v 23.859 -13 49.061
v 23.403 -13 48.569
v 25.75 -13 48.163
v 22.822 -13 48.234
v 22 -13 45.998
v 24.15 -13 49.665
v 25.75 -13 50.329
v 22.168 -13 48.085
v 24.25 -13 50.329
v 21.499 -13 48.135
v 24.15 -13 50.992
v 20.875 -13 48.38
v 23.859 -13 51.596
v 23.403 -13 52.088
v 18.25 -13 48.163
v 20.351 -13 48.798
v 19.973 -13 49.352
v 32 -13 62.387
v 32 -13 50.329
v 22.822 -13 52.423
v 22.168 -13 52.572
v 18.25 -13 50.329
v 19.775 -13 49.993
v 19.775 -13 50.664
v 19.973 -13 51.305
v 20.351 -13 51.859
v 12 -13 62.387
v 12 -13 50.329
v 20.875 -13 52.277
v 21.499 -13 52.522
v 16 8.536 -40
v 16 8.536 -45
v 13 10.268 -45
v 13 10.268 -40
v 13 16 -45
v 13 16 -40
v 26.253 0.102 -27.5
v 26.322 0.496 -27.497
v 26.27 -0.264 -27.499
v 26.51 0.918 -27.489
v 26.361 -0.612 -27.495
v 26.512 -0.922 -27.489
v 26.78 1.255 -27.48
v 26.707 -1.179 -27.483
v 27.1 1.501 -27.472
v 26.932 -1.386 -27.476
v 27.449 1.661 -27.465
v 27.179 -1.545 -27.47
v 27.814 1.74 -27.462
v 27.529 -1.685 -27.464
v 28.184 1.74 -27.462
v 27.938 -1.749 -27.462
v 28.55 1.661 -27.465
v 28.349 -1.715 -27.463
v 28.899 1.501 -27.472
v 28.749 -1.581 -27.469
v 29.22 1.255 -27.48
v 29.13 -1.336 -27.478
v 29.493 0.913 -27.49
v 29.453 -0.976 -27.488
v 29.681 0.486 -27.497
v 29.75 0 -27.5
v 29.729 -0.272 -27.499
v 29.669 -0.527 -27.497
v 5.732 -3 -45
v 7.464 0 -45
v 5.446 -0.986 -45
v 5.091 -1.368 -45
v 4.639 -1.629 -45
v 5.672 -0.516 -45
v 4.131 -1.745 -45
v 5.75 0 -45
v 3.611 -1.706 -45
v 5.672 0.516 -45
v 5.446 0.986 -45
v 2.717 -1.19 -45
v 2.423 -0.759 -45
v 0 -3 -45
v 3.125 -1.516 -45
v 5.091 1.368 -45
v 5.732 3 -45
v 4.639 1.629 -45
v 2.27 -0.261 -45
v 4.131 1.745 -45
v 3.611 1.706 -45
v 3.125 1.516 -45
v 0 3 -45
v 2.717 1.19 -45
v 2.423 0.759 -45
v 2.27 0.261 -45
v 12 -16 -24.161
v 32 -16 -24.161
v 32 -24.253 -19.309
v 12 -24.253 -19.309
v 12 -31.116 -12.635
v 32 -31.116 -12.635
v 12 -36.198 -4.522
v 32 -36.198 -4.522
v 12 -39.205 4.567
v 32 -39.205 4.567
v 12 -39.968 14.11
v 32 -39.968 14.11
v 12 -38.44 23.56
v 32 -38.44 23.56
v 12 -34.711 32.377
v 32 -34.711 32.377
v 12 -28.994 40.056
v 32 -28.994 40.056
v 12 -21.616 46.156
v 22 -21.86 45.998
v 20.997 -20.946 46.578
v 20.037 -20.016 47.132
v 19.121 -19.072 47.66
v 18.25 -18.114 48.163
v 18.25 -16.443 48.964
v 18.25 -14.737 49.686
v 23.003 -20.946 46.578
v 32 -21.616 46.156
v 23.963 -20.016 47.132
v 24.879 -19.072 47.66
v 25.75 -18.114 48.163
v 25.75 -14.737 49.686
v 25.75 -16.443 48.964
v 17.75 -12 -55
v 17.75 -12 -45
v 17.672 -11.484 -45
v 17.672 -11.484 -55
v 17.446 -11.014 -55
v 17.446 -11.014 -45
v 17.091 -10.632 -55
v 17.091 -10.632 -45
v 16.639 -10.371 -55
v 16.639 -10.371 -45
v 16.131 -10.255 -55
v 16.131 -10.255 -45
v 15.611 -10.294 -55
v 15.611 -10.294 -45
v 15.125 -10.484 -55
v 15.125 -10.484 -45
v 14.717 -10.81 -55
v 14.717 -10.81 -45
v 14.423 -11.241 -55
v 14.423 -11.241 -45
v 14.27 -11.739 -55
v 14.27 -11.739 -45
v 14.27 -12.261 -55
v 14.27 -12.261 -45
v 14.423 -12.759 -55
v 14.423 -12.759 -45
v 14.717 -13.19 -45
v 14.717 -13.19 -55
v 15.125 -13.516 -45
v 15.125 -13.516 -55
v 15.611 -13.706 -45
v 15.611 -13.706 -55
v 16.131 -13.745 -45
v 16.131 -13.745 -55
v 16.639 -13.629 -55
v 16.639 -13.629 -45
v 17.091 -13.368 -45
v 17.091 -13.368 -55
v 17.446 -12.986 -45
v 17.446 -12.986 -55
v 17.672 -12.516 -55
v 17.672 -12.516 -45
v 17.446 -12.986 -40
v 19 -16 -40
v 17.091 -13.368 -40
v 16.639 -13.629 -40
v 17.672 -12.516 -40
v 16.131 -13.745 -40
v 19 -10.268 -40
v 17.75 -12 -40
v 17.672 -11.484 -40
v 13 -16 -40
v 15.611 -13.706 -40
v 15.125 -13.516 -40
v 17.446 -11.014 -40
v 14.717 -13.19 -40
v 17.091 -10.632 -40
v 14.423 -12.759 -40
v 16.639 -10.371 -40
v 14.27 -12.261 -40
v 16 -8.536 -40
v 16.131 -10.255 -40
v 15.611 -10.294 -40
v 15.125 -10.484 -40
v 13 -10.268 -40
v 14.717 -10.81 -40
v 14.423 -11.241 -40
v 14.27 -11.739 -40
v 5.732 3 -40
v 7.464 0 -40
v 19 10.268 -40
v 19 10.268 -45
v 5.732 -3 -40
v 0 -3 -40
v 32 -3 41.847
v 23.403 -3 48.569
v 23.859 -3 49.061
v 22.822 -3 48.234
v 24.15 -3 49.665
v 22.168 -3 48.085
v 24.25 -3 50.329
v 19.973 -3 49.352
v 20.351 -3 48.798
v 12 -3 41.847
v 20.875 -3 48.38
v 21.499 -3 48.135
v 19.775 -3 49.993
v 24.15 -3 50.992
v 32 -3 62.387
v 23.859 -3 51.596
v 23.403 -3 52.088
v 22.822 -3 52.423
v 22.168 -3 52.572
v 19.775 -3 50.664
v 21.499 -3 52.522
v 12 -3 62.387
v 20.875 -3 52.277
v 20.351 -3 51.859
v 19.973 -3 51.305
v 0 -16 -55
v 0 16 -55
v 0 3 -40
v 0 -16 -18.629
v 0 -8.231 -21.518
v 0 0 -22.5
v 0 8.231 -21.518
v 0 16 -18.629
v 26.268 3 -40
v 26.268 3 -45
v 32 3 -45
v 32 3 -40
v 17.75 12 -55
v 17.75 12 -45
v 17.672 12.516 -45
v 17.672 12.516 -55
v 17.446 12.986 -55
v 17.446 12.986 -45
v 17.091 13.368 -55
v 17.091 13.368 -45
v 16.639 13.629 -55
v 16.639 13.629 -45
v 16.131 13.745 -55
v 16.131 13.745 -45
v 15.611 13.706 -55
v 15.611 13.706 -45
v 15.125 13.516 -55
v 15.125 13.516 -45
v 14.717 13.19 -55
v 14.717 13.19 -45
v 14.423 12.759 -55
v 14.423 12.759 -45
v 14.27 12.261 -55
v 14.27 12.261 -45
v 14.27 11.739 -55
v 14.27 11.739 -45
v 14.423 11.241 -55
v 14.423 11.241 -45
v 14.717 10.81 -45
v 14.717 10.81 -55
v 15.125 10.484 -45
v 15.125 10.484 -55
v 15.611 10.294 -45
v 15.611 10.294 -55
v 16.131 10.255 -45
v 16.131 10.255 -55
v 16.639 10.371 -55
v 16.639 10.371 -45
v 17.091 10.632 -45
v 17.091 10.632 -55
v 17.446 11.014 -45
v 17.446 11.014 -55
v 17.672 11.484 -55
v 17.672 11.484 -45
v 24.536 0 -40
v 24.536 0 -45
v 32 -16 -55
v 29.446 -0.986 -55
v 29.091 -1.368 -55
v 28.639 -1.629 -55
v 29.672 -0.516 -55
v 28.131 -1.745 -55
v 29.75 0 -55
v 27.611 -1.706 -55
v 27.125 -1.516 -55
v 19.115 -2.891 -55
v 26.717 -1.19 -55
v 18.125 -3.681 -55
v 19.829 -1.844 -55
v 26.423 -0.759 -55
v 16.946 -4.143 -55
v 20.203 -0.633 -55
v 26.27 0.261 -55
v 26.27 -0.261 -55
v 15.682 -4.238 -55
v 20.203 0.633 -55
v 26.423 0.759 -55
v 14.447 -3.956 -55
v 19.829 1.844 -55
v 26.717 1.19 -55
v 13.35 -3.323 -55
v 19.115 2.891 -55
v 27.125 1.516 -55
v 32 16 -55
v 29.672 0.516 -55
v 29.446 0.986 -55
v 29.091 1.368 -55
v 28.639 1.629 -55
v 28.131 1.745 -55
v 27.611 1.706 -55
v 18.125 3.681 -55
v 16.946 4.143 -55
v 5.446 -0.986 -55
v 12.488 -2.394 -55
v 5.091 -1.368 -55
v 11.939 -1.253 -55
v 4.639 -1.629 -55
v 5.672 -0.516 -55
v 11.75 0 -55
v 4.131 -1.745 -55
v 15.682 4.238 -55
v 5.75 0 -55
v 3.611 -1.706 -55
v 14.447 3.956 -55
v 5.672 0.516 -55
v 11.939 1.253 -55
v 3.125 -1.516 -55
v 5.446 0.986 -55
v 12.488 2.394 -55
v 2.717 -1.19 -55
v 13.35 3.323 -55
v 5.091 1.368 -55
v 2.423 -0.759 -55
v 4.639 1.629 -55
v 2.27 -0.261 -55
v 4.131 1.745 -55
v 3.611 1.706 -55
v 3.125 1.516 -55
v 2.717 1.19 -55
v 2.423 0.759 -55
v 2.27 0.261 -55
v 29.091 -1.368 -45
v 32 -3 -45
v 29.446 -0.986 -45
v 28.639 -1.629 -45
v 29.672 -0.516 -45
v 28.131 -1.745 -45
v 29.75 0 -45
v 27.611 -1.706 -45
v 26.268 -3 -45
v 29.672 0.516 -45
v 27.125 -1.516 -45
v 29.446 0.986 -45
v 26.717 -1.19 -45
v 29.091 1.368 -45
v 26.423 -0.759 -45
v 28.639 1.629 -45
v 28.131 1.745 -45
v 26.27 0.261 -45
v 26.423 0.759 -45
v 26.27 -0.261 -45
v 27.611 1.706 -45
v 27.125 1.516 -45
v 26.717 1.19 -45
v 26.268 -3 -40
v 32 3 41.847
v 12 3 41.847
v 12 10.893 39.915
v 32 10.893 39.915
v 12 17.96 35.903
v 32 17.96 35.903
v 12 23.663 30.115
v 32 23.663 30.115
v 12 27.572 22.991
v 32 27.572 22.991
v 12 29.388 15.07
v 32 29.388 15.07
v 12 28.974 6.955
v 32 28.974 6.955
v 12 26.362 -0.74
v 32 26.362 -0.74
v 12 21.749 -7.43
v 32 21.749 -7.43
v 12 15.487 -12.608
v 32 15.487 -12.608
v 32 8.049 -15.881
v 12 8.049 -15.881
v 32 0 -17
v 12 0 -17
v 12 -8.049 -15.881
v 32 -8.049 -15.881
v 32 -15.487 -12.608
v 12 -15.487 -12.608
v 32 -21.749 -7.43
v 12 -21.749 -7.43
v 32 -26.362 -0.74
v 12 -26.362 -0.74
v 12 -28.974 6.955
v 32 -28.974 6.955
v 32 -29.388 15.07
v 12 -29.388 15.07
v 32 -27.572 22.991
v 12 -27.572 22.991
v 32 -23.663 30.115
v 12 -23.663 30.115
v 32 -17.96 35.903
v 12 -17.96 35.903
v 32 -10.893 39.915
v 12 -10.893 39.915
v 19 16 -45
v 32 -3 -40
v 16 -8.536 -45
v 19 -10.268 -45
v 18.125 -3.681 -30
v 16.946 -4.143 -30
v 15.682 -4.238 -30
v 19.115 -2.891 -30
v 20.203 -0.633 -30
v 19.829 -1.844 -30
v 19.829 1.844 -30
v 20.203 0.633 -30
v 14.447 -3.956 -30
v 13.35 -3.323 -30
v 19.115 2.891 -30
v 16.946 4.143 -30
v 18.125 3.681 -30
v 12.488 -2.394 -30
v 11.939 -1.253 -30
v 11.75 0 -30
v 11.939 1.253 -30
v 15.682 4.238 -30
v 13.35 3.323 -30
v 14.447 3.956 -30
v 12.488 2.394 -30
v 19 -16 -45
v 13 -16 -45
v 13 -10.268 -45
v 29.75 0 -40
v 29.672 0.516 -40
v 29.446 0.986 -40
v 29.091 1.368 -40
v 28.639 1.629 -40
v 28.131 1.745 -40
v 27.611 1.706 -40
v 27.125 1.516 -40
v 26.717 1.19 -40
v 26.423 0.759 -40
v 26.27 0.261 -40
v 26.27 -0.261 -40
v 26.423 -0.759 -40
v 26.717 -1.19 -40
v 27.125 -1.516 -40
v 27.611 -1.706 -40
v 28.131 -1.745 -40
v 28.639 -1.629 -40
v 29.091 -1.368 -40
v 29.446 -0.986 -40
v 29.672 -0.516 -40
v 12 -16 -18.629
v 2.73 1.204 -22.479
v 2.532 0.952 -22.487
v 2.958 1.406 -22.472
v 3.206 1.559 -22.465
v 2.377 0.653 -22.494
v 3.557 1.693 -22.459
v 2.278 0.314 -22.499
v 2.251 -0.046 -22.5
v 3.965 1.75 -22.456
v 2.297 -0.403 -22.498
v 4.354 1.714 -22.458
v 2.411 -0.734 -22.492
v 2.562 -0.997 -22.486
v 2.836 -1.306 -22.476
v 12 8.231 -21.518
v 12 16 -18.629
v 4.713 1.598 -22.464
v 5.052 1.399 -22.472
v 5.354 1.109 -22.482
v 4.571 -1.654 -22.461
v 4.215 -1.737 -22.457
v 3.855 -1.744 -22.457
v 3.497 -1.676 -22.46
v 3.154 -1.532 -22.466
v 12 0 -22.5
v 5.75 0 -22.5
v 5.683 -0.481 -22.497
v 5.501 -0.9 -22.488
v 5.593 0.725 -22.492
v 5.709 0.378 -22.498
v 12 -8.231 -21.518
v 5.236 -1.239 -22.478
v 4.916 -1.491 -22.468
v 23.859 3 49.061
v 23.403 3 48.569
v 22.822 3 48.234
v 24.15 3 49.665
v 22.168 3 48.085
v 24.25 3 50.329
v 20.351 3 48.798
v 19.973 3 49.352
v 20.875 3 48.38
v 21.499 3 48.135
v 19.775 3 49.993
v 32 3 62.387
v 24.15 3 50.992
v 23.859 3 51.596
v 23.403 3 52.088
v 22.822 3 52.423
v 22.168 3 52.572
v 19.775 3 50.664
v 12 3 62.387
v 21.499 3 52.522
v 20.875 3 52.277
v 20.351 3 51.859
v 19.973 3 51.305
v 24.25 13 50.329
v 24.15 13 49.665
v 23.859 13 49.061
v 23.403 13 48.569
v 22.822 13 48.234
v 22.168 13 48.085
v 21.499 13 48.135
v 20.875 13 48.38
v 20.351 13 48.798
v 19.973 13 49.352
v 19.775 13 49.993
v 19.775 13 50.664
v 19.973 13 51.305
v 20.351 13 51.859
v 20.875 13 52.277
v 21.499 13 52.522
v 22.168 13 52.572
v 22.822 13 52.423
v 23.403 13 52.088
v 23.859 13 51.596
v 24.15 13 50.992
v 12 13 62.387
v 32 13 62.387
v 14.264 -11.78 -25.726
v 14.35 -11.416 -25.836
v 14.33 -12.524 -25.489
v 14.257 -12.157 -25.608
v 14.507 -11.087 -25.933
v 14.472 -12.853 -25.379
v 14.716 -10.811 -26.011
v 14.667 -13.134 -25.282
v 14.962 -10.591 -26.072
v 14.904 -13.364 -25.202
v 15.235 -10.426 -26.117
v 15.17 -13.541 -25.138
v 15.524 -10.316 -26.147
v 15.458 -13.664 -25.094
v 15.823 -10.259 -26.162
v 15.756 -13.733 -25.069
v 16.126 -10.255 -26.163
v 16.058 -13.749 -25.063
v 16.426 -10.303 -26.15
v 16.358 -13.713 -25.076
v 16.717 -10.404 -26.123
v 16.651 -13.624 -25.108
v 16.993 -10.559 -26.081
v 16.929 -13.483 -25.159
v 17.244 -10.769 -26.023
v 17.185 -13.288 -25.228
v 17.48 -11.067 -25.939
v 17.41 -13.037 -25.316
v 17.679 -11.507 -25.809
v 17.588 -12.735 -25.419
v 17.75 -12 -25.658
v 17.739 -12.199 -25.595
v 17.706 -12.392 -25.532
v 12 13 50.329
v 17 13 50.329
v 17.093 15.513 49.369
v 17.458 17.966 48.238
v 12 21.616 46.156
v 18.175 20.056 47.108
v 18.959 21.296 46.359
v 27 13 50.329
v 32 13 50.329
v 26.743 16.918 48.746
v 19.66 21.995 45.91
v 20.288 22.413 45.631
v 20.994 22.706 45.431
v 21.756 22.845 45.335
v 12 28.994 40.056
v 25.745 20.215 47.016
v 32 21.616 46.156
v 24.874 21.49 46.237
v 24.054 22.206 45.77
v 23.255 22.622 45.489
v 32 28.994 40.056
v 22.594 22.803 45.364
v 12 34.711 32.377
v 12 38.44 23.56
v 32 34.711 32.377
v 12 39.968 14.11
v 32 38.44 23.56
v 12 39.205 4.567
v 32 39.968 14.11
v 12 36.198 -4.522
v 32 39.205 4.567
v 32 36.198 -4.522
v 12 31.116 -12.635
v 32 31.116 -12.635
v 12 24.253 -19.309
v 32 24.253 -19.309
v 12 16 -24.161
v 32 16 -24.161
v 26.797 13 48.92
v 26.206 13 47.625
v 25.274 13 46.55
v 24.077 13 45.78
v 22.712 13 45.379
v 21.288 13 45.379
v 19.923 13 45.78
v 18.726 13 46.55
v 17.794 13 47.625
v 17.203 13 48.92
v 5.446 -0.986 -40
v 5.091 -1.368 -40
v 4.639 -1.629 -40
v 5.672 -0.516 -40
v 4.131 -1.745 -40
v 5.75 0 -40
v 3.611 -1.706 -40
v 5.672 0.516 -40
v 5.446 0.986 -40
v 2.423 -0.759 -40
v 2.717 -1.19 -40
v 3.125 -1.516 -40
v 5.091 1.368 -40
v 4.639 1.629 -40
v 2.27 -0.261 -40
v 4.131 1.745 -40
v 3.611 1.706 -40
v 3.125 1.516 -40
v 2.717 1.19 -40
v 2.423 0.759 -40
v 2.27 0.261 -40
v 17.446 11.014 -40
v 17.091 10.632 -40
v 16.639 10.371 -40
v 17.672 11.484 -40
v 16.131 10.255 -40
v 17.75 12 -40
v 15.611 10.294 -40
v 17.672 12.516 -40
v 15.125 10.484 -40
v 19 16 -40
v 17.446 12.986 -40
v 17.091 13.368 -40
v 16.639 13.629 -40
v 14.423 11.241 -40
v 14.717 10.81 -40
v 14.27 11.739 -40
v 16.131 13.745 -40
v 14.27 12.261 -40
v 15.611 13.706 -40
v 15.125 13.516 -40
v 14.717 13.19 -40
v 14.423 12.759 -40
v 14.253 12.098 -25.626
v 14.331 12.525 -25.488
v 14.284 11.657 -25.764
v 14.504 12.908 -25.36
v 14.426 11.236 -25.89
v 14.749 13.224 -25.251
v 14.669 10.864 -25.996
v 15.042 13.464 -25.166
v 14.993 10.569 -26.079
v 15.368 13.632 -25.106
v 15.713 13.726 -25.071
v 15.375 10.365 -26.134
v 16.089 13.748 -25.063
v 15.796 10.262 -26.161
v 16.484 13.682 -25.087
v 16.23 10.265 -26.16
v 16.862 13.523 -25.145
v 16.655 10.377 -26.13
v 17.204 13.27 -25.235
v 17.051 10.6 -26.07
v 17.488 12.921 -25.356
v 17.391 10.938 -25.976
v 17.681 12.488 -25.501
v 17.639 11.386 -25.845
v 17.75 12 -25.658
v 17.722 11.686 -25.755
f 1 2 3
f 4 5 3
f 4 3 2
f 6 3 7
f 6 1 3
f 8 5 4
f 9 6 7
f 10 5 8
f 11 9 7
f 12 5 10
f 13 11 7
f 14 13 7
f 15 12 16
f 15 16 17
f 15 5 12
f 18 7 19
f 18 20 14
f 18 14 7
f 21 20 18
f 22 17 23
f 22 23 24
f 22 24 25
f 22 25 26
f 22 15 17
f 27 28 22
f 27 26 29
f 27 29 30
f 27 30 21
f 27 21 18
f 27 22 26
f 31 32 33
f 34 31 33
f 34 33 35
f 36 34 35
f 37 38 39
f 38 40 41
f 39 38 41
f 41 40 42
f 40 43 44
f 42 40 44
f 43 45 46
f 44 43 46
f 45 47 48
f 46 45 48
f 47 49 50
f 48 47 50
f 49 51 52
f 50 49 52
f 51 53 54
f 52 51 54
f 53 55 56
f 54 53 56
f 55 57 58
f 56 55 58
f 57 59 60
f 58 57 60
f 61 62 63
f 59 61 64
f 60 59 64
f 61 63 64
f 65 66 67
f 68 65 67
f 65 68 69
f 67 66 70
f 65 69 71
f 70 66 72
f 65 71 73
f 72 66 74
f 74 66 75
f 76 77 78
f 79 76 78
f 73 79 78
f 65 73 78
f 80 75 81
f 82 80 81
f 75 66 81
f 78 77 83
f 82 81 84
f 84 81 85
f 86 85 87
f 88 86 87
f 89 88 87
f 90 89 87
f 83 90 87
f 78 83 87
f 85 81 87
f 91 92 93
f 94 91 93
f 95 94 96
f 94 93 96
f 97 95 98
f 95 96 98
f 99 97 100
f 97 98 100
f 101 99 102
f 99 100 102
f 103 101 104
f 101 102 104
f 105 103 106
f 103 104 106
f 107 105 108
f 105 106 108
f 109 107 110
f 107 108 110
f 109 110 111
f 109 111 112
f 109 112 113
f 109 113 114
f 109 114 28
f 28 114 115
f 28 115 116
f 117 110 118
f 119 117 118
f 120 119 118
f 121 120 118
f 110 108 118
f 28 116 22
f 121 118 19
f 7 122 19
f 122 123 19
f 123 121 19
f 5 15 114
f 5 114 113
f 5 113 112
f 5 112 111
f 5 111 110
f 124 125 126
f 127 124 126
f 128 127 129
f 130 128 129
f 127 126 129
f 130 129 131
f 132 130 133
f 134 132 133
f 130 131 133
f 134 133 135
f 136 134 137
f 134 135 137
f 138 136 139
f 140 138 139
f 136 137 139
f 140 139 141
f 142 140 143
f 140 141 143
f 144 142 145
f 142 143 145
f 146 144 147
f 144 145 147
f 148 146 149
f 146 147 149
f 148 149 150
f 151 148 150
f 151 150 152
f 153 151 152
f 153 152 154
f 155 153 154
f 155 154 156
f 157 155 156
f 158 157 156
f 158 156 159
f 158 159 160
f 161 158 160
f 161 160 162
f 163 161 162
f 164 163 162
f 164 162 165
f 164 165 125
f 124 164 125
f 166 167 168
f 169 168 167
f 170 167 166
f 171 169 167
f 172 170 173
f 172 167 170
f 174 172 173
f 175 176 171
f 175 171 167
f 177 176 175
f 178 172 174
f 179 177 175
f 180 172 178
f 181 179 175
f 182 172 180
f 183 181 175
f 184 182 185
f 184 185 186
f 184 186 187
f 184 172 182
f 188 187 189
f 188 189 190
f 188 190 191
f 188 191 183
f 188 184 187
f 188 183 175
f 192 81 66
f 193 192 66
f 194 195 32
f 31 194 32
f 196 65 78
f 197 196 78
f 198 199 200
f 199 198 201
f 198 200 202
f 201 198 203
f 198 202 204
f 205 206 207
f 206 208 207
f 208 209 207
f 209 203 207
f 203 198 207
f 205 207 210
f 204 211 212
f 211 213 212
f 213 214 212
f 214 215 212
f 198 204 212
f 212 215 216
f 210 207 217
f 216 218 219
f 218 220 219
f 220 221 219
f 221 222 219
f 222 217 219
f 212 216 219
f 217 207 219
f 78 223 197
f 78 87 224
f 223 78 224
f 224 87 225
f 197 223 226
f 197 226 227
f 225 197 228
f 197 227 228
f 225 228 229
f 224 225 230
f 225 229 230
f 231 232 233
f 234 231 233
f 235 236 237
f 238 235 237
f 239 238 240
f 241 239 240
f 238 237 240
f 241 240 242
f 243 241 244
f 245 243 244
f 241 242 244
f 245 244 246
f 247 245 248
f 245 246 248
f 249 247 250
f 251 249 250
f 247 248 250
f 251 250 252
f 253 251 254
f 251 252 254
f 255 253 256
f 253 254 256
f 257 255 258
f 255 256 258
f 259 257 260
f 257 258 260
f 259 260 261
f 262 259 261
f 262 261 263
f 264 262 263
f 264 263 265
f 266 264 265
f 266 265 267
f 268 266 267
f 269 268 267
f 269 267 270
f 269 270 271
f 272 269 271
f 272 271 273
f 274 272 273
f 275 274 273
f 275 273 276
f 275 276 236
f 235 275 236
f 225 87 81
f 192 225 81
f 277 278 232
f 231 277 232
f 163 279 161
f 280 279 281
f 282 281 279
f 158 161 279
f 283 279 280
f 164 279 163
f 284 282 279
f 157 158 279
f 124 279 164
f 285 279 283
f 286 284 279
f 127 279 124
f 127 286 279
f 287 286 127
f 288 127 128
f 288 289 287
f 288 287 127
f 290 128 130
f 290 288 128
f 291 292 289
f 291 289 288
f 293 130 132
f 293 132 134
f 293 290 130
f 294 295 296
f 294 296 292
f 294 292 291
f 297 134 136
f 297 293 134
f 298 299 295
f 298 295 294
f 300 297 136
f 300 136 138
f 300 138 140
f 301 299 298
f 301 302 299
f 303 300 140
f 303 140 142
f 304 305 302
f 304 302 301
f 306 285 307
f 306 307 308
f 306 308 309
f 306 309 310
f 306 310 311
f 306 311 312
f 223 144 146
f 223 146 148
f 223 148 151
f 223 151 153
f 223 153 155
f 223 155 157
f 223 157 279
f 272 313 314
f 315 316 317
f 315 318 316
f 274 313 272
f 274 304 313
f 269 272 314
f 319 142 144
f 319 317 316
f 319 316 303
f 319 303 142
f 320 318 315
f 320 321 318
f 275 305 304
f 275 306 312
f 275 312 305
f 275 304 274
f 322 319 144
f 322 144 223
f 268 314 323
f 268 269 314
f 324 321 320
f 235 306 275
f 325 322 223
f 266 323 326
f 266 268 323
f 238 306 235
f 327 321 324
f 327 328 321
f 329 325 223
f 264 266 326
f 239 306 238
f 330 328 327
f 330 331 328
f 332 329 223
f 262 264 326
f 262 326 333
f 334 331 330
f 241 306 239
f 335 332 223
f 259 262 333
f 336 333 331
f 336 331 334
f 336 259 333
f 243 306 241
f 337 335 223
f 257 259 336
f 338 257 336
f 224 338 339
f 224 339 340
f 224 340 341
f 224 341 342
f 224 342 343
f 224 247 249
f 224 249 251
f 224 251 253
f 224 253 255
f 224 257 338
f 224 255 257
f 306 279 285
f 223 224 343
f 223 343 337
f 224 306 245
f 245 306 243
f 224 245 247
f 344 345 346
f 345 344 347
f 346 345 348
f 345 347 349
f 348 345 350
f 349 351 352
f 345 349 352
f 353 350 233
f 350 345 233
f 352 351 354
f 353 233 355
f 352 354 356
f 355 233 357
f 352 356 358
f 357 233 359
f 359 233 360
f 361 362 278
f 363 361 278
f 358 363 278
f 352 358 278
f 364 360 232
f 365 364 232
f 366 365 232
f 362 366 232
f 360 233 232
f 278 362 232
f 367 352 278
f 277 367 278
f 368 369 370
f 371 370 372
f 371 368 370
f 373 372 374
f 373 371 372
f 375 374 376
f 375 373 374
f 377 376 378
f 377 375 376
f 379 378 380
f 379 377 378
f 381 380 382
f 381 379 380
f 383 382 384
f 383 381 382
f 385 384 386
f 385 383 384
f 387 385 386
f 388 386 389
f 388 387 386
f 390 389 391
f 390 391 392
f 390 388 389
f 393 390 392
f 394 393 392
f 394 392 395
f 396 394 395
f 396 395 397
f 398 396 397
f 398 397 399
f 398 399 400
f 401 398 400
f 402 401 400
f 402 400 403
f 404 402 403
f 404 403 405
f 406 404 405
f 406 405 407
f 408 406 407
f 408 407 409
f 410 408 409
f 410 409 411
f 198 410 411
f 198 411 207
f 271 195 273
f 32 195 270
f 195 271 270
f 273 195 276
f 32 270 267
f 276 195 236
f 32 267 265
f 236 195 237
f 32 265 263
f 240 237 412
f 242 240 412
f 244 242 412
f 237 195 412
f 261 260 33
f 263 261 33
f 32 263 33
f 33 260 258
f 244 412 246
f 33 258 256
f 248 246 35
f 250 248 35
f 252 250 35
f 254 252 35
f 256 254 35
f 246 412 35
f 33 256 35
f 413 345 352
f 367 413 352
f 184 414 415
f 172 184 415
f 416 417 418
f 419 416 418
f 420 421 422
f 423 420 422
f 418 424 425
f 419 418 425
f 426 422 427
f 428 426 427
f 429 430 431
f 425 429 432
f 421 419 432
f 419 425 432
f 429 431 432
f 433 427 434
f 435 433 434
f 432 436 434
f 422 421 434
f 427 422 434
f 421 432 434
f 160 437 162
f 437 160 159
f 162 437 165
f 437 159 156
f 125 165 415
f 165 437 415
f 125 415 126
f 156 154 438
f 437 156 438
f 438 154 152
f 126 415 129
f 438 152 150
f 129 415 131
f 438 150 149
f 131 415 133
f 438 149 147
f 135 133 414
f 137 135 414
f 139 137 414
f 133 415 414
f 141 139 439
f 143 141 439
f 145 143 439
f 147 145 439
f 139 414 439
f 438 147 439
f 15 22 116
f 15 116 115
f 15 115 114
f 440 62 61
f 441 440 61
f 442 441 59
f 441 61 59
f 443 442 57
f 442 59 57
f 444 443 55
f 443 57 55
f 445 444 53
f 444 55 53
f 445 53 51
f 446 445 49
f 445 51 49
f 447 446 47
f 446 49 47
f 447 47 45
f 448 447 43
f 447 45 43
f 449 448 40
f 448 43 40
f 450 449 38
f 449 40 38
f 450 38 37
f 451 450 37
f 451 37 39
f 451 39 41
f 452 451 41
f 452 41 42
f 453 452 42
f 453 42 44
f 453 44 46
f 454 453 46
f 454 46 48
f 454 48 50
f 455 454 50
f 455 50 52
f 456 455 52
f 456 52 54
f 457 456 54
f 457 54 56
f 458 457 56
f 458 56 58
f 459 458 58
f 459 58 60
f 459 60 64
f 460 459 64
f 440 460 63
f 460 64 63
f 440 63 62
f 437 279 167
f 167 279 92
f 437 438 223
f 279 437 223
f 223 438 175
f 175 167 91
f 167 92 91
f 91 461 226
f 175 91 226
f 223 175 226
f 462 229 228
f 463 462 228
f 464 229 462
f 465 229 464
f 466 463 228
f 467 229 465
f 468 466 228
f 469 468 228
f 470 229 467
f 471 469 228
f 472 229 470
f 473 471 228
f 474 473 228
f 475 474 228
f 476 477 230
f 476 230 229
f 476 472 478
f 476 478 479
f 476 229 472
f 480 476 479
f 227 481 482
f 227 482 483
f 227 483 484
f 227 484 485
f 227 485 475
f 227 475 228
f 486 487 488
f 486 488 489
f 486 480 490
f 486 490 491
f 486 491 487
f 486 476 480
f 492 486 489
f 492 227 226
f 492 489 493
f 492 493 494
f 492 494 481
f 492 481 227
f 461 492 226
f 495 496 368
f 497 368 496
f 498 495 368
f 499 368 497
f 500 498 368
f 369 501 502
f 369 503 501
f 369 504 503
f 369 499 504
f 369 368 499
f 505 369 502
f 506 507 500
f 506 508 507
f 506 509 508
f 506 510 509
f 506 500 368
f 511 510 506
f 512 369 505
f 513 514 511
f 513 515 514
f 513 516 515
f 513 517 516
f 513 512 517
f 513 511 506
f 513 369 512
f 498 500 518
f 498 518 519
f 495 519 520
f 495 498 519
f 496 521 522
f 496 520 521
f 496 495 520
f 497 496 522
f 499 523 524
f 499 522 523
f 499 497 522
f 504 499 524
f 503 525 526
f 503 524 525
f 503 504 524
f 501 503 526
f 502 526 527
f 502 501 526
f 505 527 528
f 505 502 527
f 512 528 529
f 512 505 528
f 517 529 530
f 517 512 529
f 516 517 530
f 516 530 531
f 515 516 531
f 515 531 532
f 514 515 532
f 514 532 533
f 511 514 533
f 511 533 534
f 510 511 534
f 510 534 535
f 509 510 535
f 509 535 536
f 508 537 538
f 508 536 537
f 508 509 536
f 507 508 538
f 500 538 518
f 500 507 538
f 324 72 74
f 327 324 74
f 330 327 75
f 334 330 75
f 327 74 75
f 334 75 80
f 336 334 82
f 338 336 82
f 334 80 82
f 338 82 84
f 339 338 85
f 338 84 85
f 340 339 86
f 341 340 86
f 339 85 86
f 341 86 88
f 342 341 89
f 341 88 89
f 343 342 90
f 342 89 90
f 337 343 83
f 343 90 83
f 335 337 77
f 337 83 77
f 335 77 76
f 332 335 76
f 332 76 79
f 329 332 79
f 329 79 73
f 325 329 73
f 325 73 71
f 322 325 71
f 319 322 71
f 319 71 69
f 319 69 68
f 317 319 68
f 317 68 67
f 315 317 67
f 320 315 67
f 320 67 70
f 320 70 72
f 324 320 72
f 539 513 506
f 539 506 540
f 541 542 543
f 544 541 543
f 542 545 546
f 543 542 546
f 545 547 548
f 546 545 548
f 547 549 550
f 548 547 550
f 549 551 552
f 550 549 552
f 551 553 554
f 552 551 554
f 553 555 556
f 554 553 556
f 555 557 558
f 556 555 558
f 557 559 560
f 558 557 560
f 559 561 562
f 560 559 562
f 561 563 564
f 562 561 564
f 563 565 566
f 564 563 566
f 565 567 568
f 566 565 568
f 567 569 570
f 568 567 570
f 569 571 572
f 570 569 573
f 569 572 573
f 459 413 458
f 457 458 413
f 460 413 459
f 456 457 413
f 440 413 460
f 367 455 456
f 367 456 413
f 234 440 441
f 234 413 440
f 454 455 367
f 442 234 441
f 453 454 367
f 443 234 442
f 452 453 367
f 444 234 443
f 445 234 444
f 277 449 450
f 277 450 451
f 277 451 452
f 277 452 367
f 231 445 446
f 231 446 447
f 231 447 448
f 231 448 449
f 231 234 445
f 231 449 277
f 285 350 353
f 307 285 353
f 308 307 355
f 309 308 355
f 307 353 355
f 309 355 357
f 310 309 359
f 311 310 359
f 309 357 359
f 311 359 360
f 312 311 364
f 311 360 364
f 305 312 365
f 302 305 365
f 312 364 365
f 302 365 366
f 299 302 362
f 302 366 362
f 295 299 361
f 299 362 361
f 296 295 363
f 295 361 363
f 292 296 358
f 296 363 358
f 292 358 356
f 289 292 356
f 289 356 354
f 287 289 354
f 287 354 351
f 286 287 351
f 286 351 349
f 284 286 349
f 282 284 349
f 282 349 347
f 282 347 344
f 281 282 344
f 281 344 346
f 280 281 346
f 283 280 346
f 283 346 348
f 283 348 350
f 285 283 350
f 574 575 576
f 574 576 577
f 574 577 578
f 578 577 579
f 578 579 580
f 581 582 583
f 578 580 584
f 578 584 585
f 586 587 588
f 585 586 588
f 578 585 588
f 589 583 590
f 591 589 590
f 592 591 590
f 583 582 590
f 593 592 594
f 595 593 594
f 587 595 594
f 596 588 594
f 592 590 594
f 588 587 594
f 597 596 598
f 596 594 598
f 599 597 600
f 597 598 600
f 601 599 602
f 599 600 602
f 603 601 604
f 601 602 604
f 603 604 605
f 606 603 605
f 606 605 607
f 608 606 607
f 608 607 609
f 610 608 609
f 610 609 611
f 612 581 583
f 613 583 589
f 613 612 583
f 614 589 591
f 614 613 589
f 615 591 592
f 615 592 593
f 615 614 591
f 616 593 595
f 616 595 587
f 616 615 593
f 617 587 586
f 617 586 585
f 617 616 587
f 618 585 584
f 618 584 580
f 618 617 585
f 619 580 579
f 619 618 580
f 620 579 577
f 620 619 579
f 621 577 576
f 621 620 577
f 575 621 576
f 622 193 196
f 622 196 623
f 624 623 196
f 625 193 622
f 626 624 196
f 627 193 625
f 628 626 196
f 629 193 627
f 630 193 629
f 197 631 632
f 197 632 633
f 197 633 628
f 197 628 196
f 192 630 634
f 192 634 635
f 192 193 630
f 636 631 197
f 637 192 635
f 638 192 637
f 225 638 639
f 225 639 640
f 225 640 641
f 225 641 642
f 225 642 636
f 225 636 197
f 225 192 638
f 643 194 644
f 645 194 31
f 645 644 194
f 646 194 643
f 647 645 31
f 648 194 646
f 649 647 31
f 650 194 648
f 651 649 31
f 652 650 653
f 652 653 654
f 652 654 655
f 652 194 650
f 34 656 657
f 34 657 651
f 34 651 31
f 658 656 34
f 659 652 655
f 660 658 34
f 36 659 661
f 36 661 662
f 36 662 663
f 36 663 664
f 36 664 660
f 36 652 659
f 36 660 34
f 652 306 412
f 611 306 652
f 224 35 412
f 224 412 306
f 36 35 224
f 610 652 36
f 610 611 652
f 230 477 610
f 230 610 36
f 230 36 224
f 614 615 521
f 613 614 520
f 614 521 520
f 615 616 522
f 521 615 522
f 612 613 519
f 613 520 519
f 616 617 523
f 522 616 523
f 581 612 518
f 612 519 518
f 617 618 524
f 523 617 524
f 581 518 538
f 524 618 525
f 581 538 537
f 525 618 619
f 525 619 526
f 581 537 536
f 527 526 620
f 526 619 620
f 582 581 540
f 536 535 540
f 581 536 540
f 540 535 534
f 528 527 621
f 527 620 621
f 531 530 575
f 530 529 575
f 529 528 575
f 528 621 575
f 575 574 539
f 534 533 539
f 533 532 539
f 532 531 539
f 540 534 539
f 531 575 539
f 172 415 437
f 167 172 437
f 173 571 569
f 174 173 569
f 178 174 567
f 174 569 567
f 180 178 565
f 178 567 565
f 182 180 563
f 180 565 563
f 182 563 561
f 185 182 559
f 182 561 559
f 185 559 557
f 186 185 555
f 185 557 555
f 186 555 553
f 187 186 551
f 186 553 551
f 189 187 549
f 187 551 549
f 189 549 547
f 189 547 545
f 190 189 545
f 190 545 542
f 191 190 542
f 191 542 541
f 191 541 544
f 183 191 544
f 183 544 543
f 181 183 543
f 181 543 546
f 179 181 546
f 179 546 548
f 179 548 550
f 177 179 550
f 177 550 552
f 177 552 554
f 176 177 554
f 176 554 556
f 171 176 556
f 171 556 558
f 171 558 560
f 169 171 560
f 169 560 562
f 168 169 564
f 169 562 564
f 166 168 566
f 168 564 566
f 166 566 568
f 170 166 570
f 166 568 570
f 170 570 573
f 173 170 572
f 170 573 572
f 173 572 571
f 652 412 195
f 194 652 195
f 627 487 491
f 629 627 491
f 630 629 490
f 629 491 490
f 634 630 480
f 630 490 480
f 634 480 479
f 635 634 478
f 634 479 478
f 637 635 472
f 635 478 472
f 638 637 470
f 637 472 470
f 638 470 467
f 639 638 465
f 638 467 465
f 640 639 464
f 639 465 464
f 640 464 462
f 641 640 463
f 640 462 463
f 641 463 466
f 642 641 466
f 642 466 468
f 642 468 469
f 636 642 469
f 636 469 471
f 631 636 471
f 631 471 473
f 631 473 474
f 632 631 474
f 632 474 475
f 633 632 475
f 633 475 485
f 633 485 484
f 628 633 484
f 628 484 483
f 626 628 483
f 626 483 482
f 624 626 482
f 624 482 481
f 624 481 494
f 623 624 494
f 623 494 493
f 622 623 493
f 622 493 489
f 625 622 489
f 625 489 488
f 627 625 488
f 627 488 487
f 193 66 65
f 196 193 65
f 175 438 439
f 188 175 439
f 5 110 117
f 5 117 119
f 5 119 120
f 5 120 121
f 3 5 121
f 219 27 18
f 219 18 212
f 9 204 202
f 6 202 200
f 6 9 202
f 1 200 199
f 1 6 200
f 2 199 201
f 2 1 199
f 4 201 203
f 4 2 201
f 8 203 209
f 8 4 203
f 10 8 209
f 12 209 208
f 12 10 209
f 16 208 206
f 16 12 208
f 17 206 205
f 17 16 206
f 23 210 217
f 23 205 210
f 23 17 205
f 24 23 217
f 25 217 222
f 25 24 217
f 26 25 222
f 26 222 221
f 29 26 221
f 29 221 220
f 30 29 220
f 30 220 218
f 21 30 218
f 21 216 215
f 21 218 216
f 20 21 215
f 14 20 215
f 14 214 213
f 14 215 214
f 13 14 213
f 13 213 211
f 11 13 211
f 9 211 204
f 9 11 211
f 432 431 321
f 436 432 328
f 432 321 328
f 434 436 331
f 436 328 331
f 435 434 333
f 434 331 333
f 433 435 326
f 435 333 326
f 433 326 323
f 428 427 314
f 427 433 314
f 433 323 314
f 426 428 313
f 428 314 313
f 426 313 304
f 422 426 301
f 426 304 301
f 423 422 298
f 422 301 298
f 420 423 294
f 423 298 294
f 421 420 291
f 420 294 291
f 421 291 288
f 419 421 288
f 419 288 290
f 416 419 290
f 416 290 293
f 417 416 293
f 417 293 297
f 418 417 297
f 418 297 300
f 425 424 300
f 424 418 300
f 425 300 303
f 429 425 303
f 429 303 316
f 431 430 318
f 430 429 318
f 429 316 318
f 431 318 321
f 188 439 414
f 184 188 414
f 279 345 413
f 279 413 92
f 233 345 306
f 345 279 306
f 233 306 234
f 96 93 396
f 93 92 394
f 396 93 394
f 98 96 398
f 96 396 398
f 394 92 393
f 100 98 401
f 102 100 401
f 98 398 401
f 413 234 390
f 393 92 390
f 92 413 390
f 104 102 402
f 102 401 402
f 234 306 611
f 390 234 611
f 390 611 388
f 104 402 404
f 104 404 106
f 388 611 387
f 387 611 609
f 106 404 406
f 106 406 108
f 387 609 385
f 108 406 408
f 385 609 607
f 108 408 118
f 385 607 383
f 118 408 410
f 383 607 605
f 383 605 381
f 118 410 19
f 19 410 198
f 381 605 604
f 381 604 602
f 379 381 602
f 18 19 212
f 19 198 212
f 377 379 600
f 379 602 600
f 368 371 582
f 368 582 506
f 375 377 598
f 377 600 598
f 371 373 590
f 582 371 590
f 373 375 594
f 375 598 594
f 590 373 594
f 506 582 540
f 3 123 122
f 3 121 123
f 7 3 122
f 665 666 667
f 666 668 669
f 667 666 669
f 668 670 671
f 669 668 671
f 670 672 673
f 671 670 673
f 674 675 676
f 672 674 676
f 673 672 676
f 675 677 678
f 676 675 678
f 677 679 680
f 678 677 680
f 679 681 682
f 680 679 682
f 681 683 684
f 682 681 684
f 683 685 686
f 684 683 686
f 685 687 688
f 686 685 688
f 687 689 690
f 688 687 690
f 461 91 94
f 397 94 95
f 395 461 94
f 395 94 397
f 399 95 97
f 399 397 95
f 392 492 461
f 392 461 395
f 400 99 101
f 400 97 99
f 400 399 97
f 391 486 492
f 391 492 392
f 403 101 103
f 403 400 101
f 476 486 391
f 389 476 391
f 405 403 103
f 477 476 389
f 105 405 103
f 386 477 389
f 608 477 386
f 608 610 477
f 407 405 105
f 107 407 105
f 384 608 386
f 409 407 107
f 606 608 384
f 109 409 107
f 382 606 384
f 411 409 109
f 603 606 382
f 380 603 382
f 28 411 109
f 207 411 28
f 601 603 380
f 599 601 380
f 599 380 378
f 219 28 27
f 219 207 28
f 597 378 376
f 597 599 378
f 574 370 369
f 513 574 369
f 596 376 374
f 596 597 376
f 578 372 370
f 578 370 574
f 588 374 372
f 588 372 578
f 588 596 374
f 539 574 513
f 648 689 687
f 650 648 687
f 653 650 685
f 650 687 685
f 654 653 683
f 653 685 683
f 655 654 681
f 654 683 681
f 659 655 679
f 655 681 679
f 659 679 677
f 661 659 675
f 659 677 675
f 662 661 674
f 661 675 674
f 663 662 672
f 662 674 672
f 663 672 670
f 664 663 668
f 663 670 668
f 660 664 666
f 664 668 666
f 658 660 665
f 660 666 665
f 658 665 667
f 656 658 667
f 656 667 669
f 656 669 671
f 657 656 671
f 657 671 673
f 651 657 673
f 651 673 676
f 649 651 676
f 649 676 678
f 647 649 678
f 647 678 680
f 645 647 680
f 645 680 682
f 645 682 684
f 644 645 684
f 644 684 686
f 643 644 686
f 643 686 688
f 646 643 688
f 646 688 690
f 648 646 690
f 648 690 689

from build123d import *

# Parameters (mm, degrees)
BOSS_EXTRUDE1_DEPTH       = 32
SKETCH4_R                 = 16
CUT_EXTRUDE3_DEPTH        = 15
SKETCH5_R                 = 7
SKETCH5_R_2               = 4
BOSS_EXTRUDE2_DEPTH       = 17
SKETCH15_W                = 16
SKETCH15_H                = 32
CUT_EXTRUDE6_DEPTH        = 15
SKETCH16_W                = 32
SKETCH16_H                = 32
BOSS_EXTRUDE6_DEPTH       = 30
SKETCH17_R                = 1.75
CUT_EXTRUDE8_DEPTH        = 53.92447449
CUT_EXTRUDE10_START       = -10
CUT_EXTRUDE10_DEPTH       = 5
SKETCH20_R                = 4.25
CUT_EXTRUDE11_DEPTH       = 39
CUT_EXTRUDE12_DEPTH       = 10
SKETCH22_R                = 6.5
CUT_EXTRUDE13_DEPTH       = 10
SKETCH23_R                = 1.75
CUT_EXTRUDE14_DEPTH       = 10
CUT_EXTRUDE16_REACH       = 64.498
SKETCH24_R                = 22.5
BOSS_EXTRUDE7_START       = 11.749999897
BOSS_EXTRUDE7_DEPTH       = 8.500000103
SKETCH26_R                = 8.5
CUT_EXTRUDE17_DEPTH       = 10
SKETCH27_R                = 16
BOSS_EXTRUDE8_DEPTH       = 7
SKETCH28_R                = 35
CUT_EXTRUDE18_DEPTH       = 63.498000008
BOSS_EXTRUDE9_START       = -7
SKETCH29_R                = 35
BOSS_EXTRUDE9_DEPTH       = 7
BOSS_EXTRUDE10_DEPTH      = 3
SKETCH31_R                = 15
CUT_EXTRUDE19_DEPTH       = 69.804069679
SKETCH32_R                = 2.2
CUT_EXTRUDE20_DEPTH       = 69.804069679
BOSS_EXTRUDE11_DEPTH      = 10
BOSS_EXTRUDE11_DEPTH_BACK = 10
SKETCH33_R                = 40
SKETCH33_R_2              = 29.5
CUT_EXTRUDE21_START       = -10
SKETCH34_R                = 29.5
CUT_EXTRUDE21_DEPTH       = 10
SKETCH35_W                = 26.144944591
SKETCH35_H                = 6
CUT_EXTRUDE22_DEPTH       = 71.887234394
SKETCH36_W                = 13.986084995
SKETCH36_H                = 10
BOSS_EXTRUDE12_DEPTH      = 20
CUT_EXTRUDE23_DEPTH       = 88.893005187
CUT_EXTRUDE23_DEPTH_BACK  = 88.893005187
SKETCH37_R                = 2.25
SKETCH38_R                = 5
CUT_EXTRUDE24_DEPTH       = 88.893005284
CUT_EXTRUDE25_DEPTH       = 88.893005284


# Read off the part's stored shape, not the designer's step: Boss-Extrude7
with BuildPart() as part:
    # Sketch1 → Boss-Extrude1 (new body)
    with BuildSketch(Plane(origin=(0, 0, 0), x_dir=(0, -1, 0), z_dir=(1, 0, 0))):
        with BuildLine():
            ThreePointArc((-16, 0), (0, 16), (16, 0))
            Line((16, 0), (16, 25))
            Line((16, 25), (-16, 25))
            Line((-16, 25), (-16, 0))
        make_face()
        with BuildLine():
            ThreePointArc((-4.5, 0), (0, 4.5), (4.5, 0))
            Line((4.5, 0), (16, 0))
            ThreePointArc((16, 0), (0, 16), (-16, 0))
            Line((-16, 0), (-4.5, 0))
        make_face()
        with BuildLine():
            Line((16, 0), (4.5, 0))
            ThreePointArc((4.5, 0), (0, -4.5), (-4.5, 0))
            Line((-4.5, 0), (-16, 0))
            ThreePointArc((-16, 0), (0, -16), (16, 0))
        make_face()
        with BuildLine():
            ThreePointArc((-4.5, 0), (0, 4.5), (4.5, 0))
            Line((4.5, 0), (16, 0))
            ThreePointArc((16, 0), (0, 16), (-16, 0))
            Line((-16, 0), (-4.5, 0))
        make_face()
        with BuildLine():
            Line((16, 0), (4.5, 0))
            ThreePointArc((4.5, 0), (0, -4.5), (-4.5, 0))
            Line((-4.5, 0), (-16, 0))
            ThreePointArc((-16, 0), (0, -16), (16, 0))
        make_face()
    extrude(amount=BOSS_EXTRUDE1_DEPTH)

    # Sketch4 → Cut-Extrude3 (cut)
    with BuildSketch(Plane.ZY):
        Circle(SKETCH4_R)
    extrude(amount=-CUT_EXTRUDE3_DEPTH, mode=Mode.SUBTRACT)

    # Sketch5 → Boss-Extrude2 (add)
    with BuildSketch(Plane.ZY.offset(-15)):
        Circle(SKETCH5_R)
        Circle(SKETCH5_R_2, mode=Mode.SUBTRACT)
    extrude(amount=-BOSS_EXTRUDE2_DEPTH)

    # Sketch15 → Cut-Extrude6 (cut)
    with BuildSketch(Plane.ZY):
        with Locations((-8, 0)):
            Rectangle(SKETCH15_W, SKETCH15_H)
    extrude(amount=-CUT_EXTRUDE6_DEPTH, mode=Mode.SUBTRACT)

    # Sketch16 → Boss-Extrude6 (add)
    with BuildSketch(Plane(origin=(0, 0, -25), x_dir=(-1, 0, 0), z_dir=(0, 0, -1))):
        with Locations((-16, 0)):
            Rectangle(SKETCH16_W, SKETCH16_H)
    extrude(amount=BOSS_EXTRUDE6_DEPTH)

    # Sketch17 → Cut-Extrude8 (cut, through all)
    with BuildSketch(Plane.XY.offset(-16)):
        with Locations((4, 0)):
            Circle(SKETCH17_R)
        with Locations((16, 12)):
            Circle(SKETCH17_R)
        with Locations((28, 0)):
            Circle(SKETCH17_R)
        with Locations((16, -12)):
            Circle(SKETCH17_R)
    extrude(amount=-CUT_EXTRUDE8_DEPTH, mode=Mode.SUBTRACT)

    # Sketch19 → Cut-Extrude10 (cut)
    with BuildSketch(Plane(origin=(0, 0, -55), x_dir=(-1, 0, 0), z_dir=(0, 0, -1)).offset(CUT_EXTRUDE10_START)):
        Polygon((0, 3), (-5.732050808, 3), (-7.464101615, 0), (-5.732050808, -3), (0, -3), align=None)
        Polygon((-16, -8.535898385), (-19, -10.267949192), (-19, -16), (-13, -16), (-13, -10.267949192), align=None)
        Polygon((-24.535898385, 0), (-26.267949192, 3), (-32, 3), (-32, -3), (-26.267949192, -3), align=None)
        Polygon((-16, 8.535898385), (-13, 10.267949192), (-13, 16), (-19, 16), (-19, 10.267949192), align=None)
    extrude(amount=-CUT_EXTRUDE10_DEPTH, mode=Mode.SUBTRACT)

    # Sketch20 → Cut-Extrude11 (cut)
    with BuildSketch(Plane(origin=(0, 0, -55), x_dir=(-1, 0, 0), z_dir=(0, 0, -1))):
        with Locations((-16, 0)):
            Circle(SKETCH20_R)
    extrude(amount=-CUT_EXTRUDE11_DEPTH, mode=Mode.SUBTRACT)

    # Sketch21 → Cut-Extrude12 (cut)
    with BuildSketch(Plane.ZY.offset(-15)):
        with BuildLine():
            Line((0, 16), (-16, 16))
            Line((-16, 16), (-16, 13.436140662))
            Line((-16, 13.436140662), (-16, 10.563859338))
            Line((-16, 10.563859338), (-16, 4.13067791))
            Line((-16, 4.13067791), (-16, -4.13067791))
            Line((-16, -4.13067791), (-16, -10.563859338))
            Line((-16, -10.563859338), (-16, -13.436140662))
            Line((-16, -13.436140662), (-16, -16))
            Line((-16, -16), (0, -16))
            ThreePointArc((0, -16), (16, 0), (0, 16))
        make_face()
    extrude(amount=-CUT_EXTRUDE12_DEPTH, mode=Mode.SUBTRACT)

    # Sketch22 → Cut-Extrude13 (cut)
    with BuildSketch(Plane.ZY.offset(-25)):
        Circle(SKETCH22_R)
    extrude(amount=-CUT_EXTRUDE13_DEPTH, mode=Mode.SUBTRACT)

    # Sketch23 → Cut-Extrude14 (cut)
    with BuildSketch(Plane.ZY.offset(-25)):
        with Locations((0, 12.5)):
            Circle(SKETCH23_R)
        with Locations((0, -12.5)):
            Circle(SKETCH23_R)
    extrude(amount=-CUT_EXTRUDE14_DEPTH, mode=Mode.SUBTRACT)

    # Cut-Extrude16: up to this face of the body (flat: up to its plane)
    cut_extrude16_end = Plane(part.part.faces().sort_by_distance((0, 0, -35.327586207))[0])
    # Sketch24 → Cut-Extrude16 (cut, up to the picked face)
    with BuildSketch(Plane.ZY.offset(-25), mode=Mode.PRIVATE) as cut_extrude16_sk1:
        Circle(SKETCH24_R)
    cut_extrude16_tool1 = split(extrude(cut_extrude16_sk1.sketch, amount=CUT_EXTRUDE16_REACH, mode=Mode.PRIVATE), bisect_by=cut_extrude16_end, keep=Keep.BOTH, mode=Mode.PRIVATE)
    add(cut_extrude16_tool1.solids().sort_by(Axis((25, 0, 0), (-1, 0, 0)))[0], mode=Mode.SUBTRACT)

    # Boss-Extrude7 outline → Boss-Extrude7 (add)
    with BuildSketch(Plane.YZ.offset(BOSS_EXTRUDE7_START)):
        with BuildLine():
            ThreePointArc((6, -21.685248442), (0, -22.5), (-6, -21.685248442))
            Line((-6, -21.685248442), (-6, -30))
            Line((-6, -30), (6, -30))
            Line((6, -30), (6, -21.685248442))
        make_face()
    extrude(amount=BOSS_EXTRUDE7_DEPTH)

    # Sketch26 → Cut-Extrude17 (cut)
    with BuildSketch(Plane.ZY.offset(-25)):
        Circle(SKETCH26_R)
    extrude(amount=-CUT_EXTRUDE17_DEPTH, mode=Mode.SUBTRACT)

    # Sketch27 → Boss-Extrude8 (add)
    with BuildSketch(Plane.ZY.offset(-25)):
        Circle(SKETCH27_R)
    extrude(amount=-BOSS_EXTRUDE8_DEPTH)

    # Sketch28 → Cut-Extrude18 (cut, through all)
    with BuildSketch(Plane.ZY.offset(-25)):
        with Locations((12.5, 0)):
            Circle(SKETCH28_R)
    extrude(amount=CUT_EXTRUDE18_DEPTH, mode=Mode.SUBTRACT)

    # Sketch29 → Boss-Extrude9 (add)
    with BuildSketch(Plane.ZY.offset(-25).offset(BOSS_EXTRUDE9_START)):
        with Locations((12.5, 0)):
            Circle(SKETCH29_R)
    extrude(amount=BOSS_EXTRUDE9_DEPTH)

    # Sketch30 → Boss-Extrude10 (add)
    with BuildSketch(Plane.ZY.offset(-25)):
        with BuildLine():
            ThreePointArc((-18.628764833, -16), (47.5, 0), (-18.628764833, 16))
            ThreePointArc((-18.628764833, 16), (-22.5, 0), (-18.628764833, -16))
        make_face()
    extrude(amount=BOSS_EXTRUDE10_DEPTH)

    # Sketch31 → Cut-Extrude19 (cut, through all)
    with BuildSketch(Plane.ZY.offset(-22)):
        with Locations((12.5, 0)):
            Circle(SKETCH31_R)
    extrude(amount=-CUT_EXTRUDE19_DEPTH, mode=Mode.SUBTRACT)

    # Sketch32 → Cut-Extrude20 (cut, through all)
    with BuildSketch(Plane.ZY.offset(-22)):
        with Locations((12.52327174, 25.399989339)):
            Circle(SKETCH32_R)
        with Locations((-5.444049099, 17.976960309)):
            Circle(SKETCH32_R)
        with Locations((-12.899989339, 0.02327174)):
            Circle(SKETCH32_R)
        with Locations((-5.476960309, -17.944049099)):
            Circle(SKETCH32_R)
        with Locations((12.47672826, -25.399989339)):
            Circle(SKETCH32_R)
        with Locations((30.444049099, -17.976960309)):
            Circle(SKETCH32_R)
        with Locations((30.476960309, 17.944049099)):
            Circle(SKETCH32_R)
    extrude(amount=-CUT_EXTRUDE20_DEPTH, mode=Mode.SUBTRACT)

    # Sketch33 → Boss-Extrude11 (add, two sides: drawn at the far end of the back side and taken through both)
    with BuildSketch(Plane.ZY.offset(-22).offset(-BOSS_EXTRUDE11_DEPTH_BACK)):
        with Locations((12.5, 0)):
            Circle(SKETCH33_R)
        with Locations((12.5, 0)):
            Circle(SKETCH33_R_2, mode=Mode.SUBTRACT)
    extrude(amount=BOSS_EXTRUDE11_DEPTH + BOSS_EXTRUDE11_DEPTH_BACK)

    # Sketch34 → Cut-Extrude21 (cut)
    with BuildSketch(Plane.ZY.offset(-22).offset(CUT_EXTRUDE21_START)):
        with Locations((12.5, 0)):
            Circle(SKETCH34_R)
    extrude(amount=CUT_EXTRUDE21_DEPTH, mode=Mode.SUBTRACT)

    # Sketch35 → Cut-Extrude22 (cut, through all)
    with BuildSketch(Plane.ZY.offset(-12)):
        with Locations((47.365138907, 0)):
            Rectangle(SKETCH35_W, SKETCH35_H)
    extrude(amount=-CUT_EXTRUDE22_DEPTH, mode=Mode.SUBTRACT)

    # Sketch36 → Boss-Extrude12 (add)
    with BuildSketch(Plane.ZY.offset(-12)):
        with Locations((55.394298853, 8)):
            Rectangle(SKETCH36_W, SKETCH36_H)
        with Locations((55.394298853, -8)):
            Rectangle(SKETCH36_W, SKETCH36_H)
    extrude(amount=-BOSS_EXTRUDE12_DEPTH)

    # Sketch37 → Cut-Extrude23 (cut, two sides: drawn at the far end of the back side and taken through both)
    with BuildSketch(Plane(origin=(0, 13, 0), x_dir=(1, 0, 0), z_dir=(0, 1, 0)).offset(-CUT_EXTRUDE23_DEPTH_BACK)):
        with Locations((22, -50.328560639)):
            Circle(SKETCH37_R)
    extrude(amount=CUT_EXTRUDE23_DEPTH + CUT_EXTRUDE23_DEPTH_BACK, mode=Mode.SUBTRACT)

    # Sketch38 → Cut-Extrude24 (cut, through all)
    with BuildSketch(Plane(origin=(0, 13, 0), x_dir=(1, 0, 0), z_dir=(0, 1, 0))):
        with Locations((22, -50.328560639)):
            Circle(SKETCH38_R)
    extrude(amount=CUT_EXTRUDE24_DEPTH, mode=Mode.SUBTRACT)

    # Sketch39 → Cut-Extrude25 (cut, through all)
    with BuildSketch(Plane.XZ.offset(13)):
        Polygon((25.75, 52.493624148), (22, 54.658687658), (18.25, 52.493624148), (18.25, 48.163497129), (22, 45.99843362), (25.75, 48.163497129), align=None)
    extrude(amount=CUT_EXTRUDE25_DEPTH, mode=Mode.SUBTRACT)


solid = part.part
